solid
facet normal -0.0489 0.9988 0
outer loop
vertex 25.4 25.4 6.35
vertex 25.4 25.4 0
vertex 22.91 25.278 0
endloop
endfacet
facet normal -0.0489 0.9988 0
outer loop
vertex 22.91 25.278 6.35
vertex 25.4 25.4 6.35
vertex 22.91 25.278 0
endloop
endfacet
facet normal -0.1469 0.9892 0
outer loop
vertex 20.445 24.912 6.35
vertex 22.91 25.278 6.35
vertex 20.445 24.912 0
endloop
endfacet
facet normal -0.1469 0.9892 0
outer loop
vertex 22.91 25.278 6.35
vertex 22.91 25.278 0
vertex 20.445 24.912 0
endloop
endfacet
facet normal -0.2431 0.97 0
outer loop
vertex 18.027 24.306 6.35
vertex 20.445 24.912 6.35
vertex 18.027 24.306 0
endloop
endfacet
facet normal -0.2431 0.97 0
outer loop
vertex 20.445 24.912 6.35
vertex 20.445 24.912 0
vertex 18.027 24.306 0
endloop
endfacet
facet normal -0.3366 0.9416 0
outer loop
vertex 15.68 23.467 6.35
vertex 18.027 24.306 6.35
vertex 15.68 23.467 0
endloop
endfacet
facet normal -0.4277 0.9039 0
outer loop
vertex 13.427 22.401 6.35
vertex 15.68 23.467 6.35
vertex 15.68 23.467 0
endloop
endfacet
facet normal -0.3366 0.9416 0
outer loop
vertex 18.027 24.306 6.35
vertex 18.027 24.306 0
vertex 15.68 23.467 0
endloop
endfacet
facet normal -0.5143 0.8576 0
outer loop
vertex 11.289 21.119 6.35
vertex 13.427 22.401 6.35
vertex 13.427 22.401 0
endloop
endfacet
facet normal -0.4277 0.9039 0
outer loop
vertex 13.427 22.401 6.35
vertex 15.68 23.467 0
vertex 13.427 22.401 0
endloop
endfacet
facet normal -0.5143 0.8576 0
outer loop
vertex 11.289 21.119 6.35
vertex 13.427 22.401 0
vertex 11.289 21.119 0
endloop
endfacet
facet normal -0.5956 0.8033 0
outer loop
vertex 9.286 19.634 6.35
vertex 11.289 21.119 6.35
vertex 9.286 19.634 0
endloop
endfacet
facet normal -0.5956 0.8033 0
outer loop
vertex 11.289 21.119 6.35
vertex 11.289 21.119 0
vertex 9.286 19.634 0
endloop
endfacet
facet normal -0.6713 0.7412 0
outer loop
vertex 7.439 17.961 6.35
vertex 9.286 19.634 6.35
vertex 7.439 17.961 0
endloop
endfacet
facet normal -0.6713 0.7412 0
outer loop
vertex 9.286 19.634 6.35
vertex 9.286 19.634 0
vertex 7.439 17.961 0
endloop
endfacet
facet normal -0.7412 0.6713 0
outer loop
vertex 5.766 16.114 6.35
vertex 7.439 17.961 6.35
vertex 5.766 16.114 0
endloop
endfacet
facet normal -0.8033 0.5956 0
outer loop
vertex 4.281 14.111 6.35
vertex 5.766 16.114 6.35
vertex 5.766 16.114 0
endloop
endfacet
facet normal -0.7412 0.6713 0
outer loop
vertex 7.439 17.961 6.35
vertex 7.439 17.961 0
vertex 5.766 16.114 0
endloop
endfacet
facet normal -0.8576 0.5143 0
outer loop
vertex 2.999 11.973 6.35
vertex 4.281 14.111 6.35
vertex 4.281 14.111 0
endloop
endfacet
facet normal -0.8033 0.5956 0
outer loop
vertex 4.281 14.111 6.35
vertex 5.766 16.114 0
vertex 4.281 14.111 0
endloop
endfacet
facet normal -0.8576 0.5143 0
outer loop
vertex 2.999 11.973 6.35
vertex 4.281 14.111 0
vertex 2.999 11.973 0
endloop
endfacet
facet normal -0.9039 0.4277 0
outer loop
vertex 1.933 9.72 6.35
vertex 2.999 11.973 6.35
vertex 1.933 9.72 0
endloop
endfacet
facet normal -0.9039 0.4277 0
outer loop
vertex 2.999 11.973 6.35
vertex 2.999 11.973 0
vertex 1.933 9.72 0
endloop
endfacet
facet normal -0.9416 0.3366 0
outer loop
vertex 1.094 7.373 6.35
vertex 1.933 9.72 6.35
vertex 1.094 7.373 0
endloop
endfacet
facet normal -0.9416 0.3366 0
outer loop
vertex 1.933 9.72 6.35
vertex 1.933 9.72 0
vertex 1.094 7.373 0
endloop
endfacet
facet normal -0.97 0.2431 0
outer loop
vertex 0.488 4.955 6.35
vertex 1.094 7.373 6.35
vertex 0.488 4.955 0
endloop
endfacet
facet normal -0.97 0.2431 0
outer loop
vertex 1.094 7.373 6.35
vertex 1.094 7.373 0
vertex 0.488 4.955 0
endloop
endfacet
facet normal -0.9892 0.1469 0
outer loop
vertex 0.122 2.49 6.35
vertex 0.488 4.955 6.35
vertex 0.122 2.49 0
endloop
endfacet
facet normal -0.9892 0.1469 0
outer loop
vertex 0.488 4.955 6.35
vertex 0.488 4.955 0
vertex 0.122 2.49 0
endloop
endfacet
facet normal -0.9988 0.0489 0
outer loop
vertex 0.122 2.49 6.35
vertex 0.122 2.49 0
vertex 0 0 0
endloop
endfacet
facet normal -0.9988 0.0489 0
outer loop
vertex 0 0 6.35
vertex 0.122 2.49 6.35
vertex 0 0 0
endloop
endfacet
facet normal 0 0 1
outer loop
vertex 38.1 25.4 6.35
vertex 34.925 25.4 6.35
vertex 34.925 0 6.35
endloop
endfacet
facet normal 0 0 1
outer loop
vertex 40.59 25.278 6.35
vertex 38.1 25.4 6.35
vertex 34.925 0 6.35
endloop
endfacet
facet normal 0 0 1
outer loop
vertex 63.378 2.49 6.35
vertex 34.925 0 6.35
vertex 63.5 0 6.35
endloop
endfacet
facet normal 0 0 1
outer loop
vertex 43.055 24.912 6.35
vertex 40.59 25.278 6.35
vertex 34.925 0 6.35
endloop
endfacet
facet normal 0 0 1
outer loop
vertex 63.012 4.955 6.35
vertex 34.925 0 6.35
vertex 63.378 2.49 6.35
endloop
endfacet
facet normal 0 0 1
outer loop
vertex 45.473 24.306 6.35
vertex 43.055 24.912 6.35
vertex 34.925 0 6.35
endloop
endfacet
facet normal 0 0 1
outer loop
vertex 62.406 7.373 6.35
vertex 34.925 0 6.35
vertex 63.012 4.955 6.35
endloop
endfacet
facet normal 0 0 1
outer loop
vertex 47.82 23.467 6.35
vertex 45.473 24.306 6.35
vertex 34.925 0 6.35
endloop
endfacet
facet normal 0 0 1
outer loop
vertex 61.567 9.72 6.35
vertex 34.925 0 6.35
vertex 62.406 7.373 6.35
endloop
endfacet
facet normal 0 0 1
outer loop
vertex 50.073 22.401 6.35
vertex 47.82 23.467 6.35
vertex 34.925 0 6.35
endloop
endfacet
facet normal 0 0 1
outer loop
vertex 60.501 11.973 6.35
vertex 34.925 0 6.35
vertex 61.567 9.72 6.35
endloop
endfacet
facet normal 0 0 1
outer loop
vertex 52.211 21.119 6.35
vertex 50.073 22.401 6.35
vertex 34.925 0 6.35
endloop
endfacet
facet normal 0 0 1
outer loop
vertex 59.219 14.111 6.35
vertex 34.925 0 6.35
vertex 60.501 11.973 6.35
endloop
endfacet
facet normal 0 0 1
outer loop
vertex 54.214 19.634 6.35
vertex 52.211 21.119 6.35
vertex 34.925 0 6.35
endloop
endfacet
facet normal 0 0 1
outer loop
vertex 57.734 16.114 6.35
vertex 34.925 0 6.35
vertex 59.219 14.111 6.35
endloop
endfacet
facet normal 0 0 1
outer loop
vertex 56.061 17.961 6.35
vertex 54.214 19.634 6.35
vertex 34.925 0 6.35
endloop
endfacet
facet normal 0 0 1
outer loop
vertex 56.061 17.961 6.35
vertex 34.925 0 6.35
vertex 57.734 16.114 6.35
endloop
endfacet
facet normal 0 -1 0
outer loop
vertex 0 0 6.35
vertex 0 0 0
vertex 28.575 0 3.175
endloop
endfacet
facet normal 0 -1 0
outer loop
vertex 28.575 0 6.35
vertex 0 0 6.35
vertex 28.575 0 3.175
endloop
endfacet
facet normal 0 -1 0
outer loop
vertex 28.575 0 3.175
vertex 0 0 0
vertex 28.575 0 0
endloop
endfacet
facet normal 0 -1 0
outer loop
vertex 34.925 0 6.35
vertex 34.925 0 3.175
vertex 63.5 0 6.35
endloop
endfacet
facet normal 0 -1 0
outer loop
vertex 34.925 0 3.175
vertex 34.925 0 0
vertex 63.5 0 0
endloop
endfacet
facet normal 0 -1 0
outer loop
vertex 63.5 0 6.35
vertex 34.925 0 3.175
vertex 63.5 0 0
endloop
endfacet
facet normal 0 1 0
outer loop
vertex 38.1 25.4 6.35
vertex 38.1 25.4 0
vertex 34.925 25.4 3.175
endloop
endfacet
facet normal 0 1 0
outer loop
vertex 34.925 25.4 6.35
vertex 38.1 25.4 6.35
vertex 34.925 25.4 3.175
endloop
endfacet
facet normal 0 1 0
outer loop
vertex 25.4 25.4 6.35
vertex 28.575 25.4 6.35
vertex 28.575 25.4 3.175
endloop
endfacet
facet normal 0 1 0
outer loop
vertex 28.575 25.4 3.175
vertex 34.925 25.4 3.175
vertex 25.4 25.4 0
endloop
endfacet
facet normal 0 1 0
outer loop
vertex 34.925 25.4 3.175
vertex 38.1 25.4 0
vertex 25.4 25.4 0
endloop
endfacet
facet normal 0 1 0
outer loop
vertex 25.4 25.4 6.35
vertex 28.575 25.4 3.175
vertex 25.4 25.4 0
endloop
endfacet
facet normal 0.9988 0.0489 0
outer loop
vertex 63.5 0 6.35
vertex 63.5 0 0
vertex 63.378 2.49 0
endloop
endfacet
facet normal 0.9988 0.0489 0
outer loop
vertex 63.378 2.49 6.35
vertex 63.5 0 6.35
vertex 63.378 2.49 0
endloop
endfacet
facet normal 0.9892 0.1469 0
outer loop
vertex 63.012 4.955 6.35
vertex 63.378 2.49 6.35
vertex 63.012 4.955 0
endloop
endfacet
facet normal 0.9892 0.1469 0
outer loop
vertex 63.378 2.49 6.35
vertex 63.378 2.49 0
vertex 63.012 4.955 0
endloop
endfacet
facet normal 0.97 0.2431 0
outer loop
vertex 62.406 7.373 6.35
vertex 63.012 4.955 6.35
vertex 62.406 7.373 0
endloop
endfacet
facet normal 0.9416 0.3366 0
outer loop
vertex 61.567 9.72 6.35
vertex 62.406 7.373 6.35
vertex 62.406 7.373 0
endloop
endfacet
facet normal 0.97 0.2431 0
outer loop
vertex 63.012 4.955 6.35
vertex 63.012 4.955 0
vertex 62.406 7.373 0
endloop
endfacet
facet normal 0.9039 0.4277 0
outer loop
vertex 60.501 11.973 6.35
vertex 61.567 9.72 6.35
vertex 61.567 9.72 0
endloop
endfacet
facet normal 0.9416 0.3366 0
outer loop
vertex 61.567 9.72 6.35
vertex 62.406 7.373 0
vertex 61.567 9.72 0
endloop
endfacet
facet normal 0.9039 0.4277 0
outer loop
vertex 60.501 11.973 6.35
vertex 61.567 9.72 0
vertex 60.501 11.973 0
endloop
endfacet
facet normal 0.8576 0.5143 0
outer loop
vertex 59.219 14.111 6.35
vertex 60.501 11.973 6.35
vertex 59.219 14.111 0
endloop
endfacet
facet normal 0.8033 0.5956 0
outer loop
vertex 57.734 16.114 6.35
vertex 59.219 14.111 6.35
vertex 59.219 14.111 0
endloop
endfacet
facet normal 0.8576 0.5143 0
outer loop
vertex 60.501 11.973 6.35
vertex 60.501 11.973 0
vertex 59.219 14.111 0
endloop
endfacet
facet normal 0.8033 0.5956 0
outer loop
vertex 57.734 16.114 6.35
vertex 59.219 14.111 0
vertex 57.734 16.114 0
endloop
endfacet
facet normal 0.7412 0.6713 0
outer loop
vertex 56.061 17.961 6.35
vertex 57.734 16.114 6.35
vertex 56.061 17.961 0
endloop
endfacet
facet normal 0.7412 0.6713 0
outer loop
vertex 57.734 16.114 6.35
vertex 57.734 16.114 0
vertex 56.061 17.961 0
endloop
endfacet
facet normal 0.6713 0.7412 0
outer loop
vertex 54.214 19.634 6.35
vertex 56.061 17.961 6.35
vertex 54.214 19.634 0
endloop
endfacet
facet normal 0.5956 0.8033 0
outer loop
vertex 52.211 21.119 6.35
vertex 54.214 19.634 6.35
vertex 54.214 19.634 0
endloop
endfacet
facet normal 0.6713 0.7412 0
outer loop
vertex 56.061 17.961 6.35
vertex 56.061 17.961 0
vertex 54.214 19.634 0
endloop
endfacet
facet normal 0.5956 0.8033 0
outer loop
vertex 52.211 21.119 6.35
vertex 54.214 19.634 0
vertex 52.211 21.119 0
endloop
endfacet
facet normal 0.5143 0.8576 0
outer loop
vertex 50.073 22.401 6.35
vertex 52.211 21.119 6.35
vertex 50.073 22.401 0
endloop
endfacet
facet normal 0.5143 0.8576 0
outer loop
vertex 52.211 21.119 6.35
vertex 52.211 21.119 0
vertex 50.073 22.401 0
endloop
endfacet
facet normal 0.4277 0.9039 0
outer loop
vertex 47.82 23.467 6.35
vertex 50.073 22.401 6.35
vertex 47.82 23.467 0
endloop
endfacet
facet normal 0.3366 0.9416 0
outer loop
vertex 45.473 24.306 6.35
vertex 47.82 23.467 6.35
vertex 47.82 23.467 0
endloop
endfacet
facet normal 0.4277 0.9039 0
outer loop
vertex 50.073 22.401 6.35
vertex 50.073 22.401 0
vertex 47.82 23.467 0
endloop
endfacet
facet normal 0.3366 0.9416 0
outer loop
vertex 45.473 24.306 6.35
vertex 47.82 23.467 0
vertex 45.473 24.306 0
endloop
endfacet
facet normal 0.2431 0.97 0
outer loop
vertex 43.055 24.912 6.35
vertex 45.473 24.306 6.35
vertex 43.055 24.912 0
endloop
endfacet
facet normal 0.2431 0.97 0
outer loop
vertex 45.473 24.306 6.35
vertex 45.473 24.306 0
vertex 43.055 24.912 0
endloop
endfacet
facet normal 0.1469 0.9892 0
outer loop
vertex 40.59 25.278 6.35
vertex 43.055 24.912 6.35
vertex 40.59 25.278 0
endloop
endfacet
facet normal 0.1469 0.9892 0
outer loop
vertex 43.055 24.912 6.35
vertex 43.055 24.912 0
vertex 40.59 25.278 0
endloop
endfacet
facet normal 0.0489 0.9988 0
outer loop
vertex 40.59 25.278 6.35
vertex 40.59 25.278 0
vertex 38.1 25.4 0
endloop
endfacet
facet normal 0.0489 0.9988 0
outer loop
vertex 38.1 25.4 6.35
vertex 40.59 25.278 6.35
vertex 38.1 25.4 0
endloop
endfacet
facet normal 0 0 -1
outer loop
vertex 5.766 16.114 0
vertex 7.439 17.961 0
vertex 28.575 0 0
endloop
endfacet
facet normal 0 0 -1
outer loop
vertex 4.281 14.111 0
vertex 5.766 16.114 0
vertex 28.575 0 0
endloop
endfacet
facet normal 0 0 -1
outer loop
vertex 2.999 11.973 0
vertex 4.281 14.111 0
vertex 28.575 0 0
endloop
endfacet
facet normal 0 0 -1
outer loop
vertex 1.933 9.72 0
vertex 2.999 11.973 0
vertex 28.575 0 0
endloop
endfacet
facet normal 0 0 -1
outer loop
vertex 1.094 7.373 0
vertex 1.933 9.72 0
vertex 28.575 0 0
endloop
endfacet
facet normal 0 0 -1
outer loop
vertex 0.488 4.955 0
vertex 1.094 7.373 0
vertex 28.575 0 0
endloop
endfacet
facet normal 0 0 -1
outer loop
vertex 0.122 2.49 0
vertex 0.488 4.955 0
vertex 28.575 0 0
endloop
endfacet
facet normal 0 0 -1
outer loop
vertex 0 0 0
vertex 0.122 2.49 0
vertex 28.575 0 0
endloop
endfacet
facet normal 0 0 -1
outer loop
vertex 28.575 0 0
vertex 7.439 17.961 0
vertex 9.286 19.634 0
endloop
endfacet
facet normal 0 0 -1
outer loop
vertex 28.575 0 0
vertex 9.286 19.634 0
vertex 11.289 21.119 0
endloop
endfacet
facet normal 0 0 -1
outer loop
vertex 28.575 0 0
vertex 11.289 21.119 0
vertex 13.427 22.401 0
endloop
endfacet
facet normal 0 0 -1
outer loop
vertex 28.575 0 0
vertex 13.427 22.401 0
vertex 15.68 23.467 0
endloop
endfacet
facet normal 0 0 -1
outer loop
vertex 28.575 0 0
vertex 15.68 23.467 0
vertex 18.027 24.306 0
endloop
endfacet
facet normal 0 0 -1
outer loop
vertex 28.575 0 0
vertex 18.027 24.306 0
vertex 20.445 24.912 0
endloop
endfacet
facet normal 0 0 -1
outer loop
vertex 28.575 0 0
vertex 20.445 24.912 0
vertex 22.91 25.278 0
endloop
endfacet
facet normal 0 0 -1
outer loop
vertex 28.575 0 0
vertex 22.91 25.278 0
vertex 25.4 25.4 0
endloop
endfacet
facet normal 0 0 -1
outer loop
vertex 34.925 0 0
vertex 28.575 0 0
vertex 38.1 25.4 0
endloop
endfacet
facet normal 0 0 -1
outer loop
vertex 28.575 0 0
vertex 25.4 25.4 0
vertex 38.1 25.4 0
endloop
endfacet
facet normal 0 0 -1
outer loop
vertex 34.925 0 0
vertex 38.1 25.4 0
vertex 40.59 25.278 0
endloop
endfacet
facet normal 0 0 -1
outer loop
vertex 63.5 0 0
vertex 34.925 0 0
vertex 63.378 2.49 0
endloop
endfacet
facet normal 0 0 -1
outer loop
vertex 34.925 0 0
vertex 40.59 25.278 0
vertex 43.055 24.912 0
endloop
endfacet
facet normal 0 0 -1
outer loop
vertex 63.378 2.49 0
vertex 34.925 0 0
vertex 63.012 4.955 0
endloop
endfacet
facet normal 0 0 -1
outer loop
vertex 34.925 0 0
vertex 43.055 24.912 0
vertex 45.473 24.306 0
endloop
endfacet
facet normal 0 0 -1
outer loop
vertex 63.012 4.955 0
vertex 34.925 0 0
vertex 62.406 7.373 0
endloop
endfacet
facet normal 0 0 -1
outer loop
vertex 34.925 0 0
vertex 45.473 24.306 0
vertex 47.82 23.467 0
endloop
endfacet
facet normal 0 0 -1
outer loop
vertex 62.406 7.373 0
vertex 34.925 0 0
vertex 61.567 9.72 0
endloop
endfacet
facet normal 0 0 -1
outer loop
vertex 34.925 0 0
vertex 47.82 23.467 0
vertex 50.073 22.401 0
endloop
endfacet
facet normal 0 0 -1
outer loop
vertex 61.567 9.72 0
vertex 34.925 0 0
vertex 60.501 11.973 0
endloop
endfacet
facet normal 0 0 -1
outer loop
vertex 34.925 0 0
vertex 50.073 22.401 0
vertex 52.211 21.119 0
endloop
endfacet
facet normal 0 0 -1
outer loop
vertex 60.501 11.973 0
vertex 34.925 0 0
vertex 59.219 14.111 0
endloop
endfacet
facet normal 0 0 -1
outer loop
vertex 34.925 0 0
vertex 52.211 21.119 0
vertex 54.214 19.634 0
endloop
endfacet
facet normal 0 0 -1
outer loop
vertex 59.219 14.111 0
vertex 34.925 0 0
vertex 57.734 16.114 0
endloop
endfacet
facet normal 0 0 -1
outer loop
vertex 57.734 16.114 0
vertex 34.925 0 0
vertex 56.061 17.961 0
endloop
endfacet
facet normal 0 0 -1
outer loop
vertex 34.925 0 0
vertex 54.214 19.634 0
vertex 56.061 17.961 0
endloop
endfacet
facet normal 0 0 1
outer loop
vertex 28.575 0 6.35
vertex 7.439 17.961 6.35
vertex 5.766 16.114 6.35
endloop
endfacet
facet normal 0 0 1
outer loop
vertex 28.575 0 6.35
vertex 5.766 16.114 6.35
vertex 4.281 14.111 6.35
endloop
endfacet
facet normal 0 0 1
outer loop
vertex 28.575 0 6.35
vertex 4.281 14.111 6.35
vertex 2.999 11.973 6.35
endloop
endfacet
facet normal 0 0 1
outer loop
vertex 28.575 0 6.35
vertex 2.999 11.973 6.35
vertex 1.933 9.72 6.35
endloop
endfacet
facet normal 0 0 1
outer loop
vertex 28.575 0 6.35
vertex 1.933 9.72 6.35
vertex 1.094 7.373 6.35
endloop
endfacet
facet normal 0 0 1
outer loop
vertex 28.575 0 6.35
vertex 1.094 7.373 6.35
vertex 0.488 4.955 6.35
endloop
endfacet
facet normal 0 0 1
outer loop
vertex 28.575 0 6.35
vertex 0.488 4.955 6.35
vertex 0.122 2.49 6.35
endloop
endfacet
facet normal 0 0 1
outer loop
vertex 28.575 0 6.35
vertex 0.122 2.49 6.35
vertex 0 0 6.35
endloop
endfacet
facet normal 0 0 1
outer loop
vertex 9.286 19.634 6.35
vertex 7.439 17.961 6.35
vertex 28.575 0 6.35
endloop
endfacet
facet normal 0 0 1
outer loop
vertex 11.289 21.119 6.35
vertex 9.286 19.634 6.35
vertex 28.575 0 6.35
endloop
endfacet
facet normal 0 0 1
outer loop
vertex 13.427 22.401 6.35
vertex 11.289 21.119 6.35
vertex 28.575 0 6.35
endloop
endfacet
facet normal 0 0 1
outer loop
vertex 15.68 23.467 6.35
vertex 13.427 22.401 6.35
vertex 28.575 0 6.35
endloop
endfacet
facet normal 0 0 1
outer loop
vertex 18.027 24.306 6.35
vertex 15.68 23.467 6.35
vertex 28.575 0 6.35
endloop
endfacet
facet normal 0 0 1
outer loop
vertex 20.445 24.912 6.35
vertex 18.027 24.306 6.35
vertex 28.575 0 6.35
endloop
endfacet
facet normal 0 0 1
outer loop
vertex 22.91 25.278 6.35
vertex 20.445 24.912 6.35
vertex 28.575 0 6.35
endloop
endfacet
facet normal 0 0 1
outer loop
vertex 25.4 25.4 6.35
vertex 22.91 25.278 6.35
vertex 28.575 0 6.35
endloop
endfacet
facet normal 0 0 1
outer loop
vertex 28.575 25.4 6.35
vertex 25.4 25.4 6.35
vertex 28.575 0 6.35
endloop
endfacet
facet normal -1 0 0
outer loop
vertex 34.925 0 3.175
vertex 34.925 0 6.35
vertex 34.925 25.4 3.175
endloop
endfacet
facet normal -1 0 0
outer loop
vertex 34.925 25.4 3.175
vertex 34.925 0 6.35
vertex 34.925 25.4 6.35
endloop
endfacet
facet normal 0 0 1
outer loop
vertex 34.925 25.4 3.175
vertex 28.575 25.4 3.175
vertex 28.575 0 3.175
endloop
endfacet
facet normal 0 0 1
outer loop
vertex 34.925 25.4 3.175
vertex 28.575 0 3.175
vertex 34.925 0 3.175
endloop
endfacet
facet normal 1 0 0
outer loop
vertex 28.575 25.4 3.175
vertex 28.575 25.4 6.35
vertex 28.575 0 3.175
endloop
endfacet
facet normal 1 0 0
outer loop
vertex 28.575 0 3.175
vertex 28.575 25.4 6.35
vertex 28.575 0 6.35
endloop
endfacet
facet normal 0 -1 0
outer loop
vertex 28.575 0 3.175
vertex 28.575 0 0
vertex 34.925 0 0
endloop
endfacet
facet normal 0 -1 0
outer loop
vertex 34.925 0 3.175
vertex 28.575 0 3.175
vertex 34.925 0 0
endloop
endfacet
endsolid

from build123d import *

# Parameters (mm, degrees)
F0_W     = 6.35
F0_H     = 25.4
F1_DEPTH = 6.35
F3_DEPTH = 3.175


with BuildPart() as f1:
    # F0 (on Top) → F1 (new body)
    with BuildSketch(Plane.XY):
        with BuildLine():
            Line((34.925, 25.400001), (34.925, 1e-06))
            Line((34.925, 1e-06), (63.5, 2e-06))
            ThreePointArc((63.5, 2e-06), (56.060512, 17.960514), (38.1, 25.400001))
            Line((38.1, 25.400001), (34.925, 25.400001))
        make_face()
        with BuildLine():
            ThreePointArc((25.4, 25.400001), (7.439487, 17.960513), (0, 0))
            Line((0, 0), (28.575, 1e-06))
            Line((28.575, 1e-06), (28.575, 25.400001))
            Line((28.575, 25.400001), (25.4, 25.400001))
        make_face()
        with Locations((31.75, 12.700001)):
            Rectangle(F0_W, F0_H)
    extrude(amount=F1_DEPTH)

    # F2 (on face) → F3 (cut)
    with BuildSketch(Plane.XY.offset(6.35)):
        Polygon((28.574999, 25.400001), (28.575, 1e-06), (34.925, 1e-06), (34.924999, 25.400001), align=None)
    extrude(amount=-F3_DEPTH, mode=Mode.SUBTRACT)


solid = f1.part
